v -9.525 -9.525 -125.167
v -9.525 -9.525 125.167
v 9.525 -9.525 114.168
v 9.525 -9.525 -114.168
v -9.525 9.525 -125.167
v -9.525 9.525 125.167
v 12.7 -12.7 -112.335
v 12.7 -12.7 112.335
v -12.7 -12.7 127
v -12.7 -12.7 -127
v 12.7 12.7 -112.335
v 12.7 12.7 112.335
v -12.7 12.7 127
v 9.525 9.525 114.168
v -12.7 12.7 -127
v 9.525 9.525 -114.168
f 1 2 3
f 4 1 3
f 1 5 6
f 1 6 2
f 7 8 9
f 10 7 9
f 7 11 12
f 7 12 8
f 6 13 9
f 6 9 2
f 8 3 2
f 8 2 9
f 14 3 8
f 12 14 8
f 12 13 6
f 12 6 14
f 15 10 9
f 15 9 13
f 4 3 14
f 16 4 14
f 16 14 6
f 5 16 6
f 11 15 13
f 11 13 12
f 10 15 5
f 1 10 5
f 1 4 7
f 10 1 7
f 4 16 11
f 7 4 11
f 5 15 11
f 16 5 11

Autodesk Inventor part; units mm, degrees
ref_plane "YZ Plane" through (0, 0, 0) normal (1, 0, 0) x (0, 1, 0)
ref_plane "XZ Plane" through (0, 0, 0) normal (0, 1, 0) x (-1, 0, 0)
ref_plane "XY Plane" through (0, 0, 0) normal (0, 0, 1) x (1, 0, 0)
sketch "Sketch1" plane through (0, 0, 0) normal (0, 0, 1) x (1, 0, 0)
  line L0 (-17.78, 0) -> (17.78, 0) projected
  line L1 (0, -17.78) -> (0, 17.78) projected
  line L2 (-12.7, 12.7) -> (12.7, 12.7)
  line L3 (12.7, 12.7) -> (12.7, -12.7)
  line L4 (12.7, -12.7) -> (-12.7, -12.7)
  line L5 (-12.7, -12.7) -> (-12.7, 12.7)
  line L6 (9.525, 9.525) -> (-9.525, 9.525)
  line L7 (-9.525, 9.525) -> (-9.525, -9.525)
  line L8 (-9.525, -9.525) -> (9.525, -9.525)
  line L9 (9.525, -9.525) -> (9.525, 9.525)
  point P0 (0, 0)
  point P1 (-12.7, 0)
  point P2 (0, 12.7)
  dimension "d0" = 25.4
  dimension "d1" = 3.175
extrude "Extrusion1" add sketch "Sketch1" along normal mid plane 254 contours L5 L2 L1 L6 L7 L0 | L0 L7 L8 L1 L4 L5 | L1 L8 L9 L0 L3 L4 | L2 L3 L0 L9 L6 L1
sketch "Sketch3" plane through (-12.7, 12.7, 127) normal (0, 1, 0) x (1, 0, 0)
  line L0 (0, 0) -> (25.4, 0) projected
  line L1 (25.4, 0) -> (25.4, 254) projected
  line L2 (0, 0) -> (25.4, 14.6647)
  line L3 (0, 0) -> (25.4, 0)
  line L4 (25.4, 14.6647) -> (25.4, 0)
  point P0 (12.7, 127)
  dimension "d7" = 30
extrude "Extrusion3" cut sketch "Sketch3" against normal through all
sketch "Sketch4" plane through (-12.7, 12.7, -127) normal (0, 1, 0) x (1, 0, 0)
  line L0 (25.4, -239.3353) -> (25.4, 0) projected
  line L1 (25.4, 0) -> (0, 0) projected
  line L2 (0, 0) -> (25.4, -14.6647)
  line L3 (25.4, 0) -> (25.4, -14.6647)
  line L4 (25.4, 0) -> (0, 0)
  point P0 (12.7, -127)
  dimension "d10" = 30
extrude "Extrusion4" cut sketch "Sketch4" against normal through all
properties part number "tubing_template_0.125" material "Aluminum-6061"
